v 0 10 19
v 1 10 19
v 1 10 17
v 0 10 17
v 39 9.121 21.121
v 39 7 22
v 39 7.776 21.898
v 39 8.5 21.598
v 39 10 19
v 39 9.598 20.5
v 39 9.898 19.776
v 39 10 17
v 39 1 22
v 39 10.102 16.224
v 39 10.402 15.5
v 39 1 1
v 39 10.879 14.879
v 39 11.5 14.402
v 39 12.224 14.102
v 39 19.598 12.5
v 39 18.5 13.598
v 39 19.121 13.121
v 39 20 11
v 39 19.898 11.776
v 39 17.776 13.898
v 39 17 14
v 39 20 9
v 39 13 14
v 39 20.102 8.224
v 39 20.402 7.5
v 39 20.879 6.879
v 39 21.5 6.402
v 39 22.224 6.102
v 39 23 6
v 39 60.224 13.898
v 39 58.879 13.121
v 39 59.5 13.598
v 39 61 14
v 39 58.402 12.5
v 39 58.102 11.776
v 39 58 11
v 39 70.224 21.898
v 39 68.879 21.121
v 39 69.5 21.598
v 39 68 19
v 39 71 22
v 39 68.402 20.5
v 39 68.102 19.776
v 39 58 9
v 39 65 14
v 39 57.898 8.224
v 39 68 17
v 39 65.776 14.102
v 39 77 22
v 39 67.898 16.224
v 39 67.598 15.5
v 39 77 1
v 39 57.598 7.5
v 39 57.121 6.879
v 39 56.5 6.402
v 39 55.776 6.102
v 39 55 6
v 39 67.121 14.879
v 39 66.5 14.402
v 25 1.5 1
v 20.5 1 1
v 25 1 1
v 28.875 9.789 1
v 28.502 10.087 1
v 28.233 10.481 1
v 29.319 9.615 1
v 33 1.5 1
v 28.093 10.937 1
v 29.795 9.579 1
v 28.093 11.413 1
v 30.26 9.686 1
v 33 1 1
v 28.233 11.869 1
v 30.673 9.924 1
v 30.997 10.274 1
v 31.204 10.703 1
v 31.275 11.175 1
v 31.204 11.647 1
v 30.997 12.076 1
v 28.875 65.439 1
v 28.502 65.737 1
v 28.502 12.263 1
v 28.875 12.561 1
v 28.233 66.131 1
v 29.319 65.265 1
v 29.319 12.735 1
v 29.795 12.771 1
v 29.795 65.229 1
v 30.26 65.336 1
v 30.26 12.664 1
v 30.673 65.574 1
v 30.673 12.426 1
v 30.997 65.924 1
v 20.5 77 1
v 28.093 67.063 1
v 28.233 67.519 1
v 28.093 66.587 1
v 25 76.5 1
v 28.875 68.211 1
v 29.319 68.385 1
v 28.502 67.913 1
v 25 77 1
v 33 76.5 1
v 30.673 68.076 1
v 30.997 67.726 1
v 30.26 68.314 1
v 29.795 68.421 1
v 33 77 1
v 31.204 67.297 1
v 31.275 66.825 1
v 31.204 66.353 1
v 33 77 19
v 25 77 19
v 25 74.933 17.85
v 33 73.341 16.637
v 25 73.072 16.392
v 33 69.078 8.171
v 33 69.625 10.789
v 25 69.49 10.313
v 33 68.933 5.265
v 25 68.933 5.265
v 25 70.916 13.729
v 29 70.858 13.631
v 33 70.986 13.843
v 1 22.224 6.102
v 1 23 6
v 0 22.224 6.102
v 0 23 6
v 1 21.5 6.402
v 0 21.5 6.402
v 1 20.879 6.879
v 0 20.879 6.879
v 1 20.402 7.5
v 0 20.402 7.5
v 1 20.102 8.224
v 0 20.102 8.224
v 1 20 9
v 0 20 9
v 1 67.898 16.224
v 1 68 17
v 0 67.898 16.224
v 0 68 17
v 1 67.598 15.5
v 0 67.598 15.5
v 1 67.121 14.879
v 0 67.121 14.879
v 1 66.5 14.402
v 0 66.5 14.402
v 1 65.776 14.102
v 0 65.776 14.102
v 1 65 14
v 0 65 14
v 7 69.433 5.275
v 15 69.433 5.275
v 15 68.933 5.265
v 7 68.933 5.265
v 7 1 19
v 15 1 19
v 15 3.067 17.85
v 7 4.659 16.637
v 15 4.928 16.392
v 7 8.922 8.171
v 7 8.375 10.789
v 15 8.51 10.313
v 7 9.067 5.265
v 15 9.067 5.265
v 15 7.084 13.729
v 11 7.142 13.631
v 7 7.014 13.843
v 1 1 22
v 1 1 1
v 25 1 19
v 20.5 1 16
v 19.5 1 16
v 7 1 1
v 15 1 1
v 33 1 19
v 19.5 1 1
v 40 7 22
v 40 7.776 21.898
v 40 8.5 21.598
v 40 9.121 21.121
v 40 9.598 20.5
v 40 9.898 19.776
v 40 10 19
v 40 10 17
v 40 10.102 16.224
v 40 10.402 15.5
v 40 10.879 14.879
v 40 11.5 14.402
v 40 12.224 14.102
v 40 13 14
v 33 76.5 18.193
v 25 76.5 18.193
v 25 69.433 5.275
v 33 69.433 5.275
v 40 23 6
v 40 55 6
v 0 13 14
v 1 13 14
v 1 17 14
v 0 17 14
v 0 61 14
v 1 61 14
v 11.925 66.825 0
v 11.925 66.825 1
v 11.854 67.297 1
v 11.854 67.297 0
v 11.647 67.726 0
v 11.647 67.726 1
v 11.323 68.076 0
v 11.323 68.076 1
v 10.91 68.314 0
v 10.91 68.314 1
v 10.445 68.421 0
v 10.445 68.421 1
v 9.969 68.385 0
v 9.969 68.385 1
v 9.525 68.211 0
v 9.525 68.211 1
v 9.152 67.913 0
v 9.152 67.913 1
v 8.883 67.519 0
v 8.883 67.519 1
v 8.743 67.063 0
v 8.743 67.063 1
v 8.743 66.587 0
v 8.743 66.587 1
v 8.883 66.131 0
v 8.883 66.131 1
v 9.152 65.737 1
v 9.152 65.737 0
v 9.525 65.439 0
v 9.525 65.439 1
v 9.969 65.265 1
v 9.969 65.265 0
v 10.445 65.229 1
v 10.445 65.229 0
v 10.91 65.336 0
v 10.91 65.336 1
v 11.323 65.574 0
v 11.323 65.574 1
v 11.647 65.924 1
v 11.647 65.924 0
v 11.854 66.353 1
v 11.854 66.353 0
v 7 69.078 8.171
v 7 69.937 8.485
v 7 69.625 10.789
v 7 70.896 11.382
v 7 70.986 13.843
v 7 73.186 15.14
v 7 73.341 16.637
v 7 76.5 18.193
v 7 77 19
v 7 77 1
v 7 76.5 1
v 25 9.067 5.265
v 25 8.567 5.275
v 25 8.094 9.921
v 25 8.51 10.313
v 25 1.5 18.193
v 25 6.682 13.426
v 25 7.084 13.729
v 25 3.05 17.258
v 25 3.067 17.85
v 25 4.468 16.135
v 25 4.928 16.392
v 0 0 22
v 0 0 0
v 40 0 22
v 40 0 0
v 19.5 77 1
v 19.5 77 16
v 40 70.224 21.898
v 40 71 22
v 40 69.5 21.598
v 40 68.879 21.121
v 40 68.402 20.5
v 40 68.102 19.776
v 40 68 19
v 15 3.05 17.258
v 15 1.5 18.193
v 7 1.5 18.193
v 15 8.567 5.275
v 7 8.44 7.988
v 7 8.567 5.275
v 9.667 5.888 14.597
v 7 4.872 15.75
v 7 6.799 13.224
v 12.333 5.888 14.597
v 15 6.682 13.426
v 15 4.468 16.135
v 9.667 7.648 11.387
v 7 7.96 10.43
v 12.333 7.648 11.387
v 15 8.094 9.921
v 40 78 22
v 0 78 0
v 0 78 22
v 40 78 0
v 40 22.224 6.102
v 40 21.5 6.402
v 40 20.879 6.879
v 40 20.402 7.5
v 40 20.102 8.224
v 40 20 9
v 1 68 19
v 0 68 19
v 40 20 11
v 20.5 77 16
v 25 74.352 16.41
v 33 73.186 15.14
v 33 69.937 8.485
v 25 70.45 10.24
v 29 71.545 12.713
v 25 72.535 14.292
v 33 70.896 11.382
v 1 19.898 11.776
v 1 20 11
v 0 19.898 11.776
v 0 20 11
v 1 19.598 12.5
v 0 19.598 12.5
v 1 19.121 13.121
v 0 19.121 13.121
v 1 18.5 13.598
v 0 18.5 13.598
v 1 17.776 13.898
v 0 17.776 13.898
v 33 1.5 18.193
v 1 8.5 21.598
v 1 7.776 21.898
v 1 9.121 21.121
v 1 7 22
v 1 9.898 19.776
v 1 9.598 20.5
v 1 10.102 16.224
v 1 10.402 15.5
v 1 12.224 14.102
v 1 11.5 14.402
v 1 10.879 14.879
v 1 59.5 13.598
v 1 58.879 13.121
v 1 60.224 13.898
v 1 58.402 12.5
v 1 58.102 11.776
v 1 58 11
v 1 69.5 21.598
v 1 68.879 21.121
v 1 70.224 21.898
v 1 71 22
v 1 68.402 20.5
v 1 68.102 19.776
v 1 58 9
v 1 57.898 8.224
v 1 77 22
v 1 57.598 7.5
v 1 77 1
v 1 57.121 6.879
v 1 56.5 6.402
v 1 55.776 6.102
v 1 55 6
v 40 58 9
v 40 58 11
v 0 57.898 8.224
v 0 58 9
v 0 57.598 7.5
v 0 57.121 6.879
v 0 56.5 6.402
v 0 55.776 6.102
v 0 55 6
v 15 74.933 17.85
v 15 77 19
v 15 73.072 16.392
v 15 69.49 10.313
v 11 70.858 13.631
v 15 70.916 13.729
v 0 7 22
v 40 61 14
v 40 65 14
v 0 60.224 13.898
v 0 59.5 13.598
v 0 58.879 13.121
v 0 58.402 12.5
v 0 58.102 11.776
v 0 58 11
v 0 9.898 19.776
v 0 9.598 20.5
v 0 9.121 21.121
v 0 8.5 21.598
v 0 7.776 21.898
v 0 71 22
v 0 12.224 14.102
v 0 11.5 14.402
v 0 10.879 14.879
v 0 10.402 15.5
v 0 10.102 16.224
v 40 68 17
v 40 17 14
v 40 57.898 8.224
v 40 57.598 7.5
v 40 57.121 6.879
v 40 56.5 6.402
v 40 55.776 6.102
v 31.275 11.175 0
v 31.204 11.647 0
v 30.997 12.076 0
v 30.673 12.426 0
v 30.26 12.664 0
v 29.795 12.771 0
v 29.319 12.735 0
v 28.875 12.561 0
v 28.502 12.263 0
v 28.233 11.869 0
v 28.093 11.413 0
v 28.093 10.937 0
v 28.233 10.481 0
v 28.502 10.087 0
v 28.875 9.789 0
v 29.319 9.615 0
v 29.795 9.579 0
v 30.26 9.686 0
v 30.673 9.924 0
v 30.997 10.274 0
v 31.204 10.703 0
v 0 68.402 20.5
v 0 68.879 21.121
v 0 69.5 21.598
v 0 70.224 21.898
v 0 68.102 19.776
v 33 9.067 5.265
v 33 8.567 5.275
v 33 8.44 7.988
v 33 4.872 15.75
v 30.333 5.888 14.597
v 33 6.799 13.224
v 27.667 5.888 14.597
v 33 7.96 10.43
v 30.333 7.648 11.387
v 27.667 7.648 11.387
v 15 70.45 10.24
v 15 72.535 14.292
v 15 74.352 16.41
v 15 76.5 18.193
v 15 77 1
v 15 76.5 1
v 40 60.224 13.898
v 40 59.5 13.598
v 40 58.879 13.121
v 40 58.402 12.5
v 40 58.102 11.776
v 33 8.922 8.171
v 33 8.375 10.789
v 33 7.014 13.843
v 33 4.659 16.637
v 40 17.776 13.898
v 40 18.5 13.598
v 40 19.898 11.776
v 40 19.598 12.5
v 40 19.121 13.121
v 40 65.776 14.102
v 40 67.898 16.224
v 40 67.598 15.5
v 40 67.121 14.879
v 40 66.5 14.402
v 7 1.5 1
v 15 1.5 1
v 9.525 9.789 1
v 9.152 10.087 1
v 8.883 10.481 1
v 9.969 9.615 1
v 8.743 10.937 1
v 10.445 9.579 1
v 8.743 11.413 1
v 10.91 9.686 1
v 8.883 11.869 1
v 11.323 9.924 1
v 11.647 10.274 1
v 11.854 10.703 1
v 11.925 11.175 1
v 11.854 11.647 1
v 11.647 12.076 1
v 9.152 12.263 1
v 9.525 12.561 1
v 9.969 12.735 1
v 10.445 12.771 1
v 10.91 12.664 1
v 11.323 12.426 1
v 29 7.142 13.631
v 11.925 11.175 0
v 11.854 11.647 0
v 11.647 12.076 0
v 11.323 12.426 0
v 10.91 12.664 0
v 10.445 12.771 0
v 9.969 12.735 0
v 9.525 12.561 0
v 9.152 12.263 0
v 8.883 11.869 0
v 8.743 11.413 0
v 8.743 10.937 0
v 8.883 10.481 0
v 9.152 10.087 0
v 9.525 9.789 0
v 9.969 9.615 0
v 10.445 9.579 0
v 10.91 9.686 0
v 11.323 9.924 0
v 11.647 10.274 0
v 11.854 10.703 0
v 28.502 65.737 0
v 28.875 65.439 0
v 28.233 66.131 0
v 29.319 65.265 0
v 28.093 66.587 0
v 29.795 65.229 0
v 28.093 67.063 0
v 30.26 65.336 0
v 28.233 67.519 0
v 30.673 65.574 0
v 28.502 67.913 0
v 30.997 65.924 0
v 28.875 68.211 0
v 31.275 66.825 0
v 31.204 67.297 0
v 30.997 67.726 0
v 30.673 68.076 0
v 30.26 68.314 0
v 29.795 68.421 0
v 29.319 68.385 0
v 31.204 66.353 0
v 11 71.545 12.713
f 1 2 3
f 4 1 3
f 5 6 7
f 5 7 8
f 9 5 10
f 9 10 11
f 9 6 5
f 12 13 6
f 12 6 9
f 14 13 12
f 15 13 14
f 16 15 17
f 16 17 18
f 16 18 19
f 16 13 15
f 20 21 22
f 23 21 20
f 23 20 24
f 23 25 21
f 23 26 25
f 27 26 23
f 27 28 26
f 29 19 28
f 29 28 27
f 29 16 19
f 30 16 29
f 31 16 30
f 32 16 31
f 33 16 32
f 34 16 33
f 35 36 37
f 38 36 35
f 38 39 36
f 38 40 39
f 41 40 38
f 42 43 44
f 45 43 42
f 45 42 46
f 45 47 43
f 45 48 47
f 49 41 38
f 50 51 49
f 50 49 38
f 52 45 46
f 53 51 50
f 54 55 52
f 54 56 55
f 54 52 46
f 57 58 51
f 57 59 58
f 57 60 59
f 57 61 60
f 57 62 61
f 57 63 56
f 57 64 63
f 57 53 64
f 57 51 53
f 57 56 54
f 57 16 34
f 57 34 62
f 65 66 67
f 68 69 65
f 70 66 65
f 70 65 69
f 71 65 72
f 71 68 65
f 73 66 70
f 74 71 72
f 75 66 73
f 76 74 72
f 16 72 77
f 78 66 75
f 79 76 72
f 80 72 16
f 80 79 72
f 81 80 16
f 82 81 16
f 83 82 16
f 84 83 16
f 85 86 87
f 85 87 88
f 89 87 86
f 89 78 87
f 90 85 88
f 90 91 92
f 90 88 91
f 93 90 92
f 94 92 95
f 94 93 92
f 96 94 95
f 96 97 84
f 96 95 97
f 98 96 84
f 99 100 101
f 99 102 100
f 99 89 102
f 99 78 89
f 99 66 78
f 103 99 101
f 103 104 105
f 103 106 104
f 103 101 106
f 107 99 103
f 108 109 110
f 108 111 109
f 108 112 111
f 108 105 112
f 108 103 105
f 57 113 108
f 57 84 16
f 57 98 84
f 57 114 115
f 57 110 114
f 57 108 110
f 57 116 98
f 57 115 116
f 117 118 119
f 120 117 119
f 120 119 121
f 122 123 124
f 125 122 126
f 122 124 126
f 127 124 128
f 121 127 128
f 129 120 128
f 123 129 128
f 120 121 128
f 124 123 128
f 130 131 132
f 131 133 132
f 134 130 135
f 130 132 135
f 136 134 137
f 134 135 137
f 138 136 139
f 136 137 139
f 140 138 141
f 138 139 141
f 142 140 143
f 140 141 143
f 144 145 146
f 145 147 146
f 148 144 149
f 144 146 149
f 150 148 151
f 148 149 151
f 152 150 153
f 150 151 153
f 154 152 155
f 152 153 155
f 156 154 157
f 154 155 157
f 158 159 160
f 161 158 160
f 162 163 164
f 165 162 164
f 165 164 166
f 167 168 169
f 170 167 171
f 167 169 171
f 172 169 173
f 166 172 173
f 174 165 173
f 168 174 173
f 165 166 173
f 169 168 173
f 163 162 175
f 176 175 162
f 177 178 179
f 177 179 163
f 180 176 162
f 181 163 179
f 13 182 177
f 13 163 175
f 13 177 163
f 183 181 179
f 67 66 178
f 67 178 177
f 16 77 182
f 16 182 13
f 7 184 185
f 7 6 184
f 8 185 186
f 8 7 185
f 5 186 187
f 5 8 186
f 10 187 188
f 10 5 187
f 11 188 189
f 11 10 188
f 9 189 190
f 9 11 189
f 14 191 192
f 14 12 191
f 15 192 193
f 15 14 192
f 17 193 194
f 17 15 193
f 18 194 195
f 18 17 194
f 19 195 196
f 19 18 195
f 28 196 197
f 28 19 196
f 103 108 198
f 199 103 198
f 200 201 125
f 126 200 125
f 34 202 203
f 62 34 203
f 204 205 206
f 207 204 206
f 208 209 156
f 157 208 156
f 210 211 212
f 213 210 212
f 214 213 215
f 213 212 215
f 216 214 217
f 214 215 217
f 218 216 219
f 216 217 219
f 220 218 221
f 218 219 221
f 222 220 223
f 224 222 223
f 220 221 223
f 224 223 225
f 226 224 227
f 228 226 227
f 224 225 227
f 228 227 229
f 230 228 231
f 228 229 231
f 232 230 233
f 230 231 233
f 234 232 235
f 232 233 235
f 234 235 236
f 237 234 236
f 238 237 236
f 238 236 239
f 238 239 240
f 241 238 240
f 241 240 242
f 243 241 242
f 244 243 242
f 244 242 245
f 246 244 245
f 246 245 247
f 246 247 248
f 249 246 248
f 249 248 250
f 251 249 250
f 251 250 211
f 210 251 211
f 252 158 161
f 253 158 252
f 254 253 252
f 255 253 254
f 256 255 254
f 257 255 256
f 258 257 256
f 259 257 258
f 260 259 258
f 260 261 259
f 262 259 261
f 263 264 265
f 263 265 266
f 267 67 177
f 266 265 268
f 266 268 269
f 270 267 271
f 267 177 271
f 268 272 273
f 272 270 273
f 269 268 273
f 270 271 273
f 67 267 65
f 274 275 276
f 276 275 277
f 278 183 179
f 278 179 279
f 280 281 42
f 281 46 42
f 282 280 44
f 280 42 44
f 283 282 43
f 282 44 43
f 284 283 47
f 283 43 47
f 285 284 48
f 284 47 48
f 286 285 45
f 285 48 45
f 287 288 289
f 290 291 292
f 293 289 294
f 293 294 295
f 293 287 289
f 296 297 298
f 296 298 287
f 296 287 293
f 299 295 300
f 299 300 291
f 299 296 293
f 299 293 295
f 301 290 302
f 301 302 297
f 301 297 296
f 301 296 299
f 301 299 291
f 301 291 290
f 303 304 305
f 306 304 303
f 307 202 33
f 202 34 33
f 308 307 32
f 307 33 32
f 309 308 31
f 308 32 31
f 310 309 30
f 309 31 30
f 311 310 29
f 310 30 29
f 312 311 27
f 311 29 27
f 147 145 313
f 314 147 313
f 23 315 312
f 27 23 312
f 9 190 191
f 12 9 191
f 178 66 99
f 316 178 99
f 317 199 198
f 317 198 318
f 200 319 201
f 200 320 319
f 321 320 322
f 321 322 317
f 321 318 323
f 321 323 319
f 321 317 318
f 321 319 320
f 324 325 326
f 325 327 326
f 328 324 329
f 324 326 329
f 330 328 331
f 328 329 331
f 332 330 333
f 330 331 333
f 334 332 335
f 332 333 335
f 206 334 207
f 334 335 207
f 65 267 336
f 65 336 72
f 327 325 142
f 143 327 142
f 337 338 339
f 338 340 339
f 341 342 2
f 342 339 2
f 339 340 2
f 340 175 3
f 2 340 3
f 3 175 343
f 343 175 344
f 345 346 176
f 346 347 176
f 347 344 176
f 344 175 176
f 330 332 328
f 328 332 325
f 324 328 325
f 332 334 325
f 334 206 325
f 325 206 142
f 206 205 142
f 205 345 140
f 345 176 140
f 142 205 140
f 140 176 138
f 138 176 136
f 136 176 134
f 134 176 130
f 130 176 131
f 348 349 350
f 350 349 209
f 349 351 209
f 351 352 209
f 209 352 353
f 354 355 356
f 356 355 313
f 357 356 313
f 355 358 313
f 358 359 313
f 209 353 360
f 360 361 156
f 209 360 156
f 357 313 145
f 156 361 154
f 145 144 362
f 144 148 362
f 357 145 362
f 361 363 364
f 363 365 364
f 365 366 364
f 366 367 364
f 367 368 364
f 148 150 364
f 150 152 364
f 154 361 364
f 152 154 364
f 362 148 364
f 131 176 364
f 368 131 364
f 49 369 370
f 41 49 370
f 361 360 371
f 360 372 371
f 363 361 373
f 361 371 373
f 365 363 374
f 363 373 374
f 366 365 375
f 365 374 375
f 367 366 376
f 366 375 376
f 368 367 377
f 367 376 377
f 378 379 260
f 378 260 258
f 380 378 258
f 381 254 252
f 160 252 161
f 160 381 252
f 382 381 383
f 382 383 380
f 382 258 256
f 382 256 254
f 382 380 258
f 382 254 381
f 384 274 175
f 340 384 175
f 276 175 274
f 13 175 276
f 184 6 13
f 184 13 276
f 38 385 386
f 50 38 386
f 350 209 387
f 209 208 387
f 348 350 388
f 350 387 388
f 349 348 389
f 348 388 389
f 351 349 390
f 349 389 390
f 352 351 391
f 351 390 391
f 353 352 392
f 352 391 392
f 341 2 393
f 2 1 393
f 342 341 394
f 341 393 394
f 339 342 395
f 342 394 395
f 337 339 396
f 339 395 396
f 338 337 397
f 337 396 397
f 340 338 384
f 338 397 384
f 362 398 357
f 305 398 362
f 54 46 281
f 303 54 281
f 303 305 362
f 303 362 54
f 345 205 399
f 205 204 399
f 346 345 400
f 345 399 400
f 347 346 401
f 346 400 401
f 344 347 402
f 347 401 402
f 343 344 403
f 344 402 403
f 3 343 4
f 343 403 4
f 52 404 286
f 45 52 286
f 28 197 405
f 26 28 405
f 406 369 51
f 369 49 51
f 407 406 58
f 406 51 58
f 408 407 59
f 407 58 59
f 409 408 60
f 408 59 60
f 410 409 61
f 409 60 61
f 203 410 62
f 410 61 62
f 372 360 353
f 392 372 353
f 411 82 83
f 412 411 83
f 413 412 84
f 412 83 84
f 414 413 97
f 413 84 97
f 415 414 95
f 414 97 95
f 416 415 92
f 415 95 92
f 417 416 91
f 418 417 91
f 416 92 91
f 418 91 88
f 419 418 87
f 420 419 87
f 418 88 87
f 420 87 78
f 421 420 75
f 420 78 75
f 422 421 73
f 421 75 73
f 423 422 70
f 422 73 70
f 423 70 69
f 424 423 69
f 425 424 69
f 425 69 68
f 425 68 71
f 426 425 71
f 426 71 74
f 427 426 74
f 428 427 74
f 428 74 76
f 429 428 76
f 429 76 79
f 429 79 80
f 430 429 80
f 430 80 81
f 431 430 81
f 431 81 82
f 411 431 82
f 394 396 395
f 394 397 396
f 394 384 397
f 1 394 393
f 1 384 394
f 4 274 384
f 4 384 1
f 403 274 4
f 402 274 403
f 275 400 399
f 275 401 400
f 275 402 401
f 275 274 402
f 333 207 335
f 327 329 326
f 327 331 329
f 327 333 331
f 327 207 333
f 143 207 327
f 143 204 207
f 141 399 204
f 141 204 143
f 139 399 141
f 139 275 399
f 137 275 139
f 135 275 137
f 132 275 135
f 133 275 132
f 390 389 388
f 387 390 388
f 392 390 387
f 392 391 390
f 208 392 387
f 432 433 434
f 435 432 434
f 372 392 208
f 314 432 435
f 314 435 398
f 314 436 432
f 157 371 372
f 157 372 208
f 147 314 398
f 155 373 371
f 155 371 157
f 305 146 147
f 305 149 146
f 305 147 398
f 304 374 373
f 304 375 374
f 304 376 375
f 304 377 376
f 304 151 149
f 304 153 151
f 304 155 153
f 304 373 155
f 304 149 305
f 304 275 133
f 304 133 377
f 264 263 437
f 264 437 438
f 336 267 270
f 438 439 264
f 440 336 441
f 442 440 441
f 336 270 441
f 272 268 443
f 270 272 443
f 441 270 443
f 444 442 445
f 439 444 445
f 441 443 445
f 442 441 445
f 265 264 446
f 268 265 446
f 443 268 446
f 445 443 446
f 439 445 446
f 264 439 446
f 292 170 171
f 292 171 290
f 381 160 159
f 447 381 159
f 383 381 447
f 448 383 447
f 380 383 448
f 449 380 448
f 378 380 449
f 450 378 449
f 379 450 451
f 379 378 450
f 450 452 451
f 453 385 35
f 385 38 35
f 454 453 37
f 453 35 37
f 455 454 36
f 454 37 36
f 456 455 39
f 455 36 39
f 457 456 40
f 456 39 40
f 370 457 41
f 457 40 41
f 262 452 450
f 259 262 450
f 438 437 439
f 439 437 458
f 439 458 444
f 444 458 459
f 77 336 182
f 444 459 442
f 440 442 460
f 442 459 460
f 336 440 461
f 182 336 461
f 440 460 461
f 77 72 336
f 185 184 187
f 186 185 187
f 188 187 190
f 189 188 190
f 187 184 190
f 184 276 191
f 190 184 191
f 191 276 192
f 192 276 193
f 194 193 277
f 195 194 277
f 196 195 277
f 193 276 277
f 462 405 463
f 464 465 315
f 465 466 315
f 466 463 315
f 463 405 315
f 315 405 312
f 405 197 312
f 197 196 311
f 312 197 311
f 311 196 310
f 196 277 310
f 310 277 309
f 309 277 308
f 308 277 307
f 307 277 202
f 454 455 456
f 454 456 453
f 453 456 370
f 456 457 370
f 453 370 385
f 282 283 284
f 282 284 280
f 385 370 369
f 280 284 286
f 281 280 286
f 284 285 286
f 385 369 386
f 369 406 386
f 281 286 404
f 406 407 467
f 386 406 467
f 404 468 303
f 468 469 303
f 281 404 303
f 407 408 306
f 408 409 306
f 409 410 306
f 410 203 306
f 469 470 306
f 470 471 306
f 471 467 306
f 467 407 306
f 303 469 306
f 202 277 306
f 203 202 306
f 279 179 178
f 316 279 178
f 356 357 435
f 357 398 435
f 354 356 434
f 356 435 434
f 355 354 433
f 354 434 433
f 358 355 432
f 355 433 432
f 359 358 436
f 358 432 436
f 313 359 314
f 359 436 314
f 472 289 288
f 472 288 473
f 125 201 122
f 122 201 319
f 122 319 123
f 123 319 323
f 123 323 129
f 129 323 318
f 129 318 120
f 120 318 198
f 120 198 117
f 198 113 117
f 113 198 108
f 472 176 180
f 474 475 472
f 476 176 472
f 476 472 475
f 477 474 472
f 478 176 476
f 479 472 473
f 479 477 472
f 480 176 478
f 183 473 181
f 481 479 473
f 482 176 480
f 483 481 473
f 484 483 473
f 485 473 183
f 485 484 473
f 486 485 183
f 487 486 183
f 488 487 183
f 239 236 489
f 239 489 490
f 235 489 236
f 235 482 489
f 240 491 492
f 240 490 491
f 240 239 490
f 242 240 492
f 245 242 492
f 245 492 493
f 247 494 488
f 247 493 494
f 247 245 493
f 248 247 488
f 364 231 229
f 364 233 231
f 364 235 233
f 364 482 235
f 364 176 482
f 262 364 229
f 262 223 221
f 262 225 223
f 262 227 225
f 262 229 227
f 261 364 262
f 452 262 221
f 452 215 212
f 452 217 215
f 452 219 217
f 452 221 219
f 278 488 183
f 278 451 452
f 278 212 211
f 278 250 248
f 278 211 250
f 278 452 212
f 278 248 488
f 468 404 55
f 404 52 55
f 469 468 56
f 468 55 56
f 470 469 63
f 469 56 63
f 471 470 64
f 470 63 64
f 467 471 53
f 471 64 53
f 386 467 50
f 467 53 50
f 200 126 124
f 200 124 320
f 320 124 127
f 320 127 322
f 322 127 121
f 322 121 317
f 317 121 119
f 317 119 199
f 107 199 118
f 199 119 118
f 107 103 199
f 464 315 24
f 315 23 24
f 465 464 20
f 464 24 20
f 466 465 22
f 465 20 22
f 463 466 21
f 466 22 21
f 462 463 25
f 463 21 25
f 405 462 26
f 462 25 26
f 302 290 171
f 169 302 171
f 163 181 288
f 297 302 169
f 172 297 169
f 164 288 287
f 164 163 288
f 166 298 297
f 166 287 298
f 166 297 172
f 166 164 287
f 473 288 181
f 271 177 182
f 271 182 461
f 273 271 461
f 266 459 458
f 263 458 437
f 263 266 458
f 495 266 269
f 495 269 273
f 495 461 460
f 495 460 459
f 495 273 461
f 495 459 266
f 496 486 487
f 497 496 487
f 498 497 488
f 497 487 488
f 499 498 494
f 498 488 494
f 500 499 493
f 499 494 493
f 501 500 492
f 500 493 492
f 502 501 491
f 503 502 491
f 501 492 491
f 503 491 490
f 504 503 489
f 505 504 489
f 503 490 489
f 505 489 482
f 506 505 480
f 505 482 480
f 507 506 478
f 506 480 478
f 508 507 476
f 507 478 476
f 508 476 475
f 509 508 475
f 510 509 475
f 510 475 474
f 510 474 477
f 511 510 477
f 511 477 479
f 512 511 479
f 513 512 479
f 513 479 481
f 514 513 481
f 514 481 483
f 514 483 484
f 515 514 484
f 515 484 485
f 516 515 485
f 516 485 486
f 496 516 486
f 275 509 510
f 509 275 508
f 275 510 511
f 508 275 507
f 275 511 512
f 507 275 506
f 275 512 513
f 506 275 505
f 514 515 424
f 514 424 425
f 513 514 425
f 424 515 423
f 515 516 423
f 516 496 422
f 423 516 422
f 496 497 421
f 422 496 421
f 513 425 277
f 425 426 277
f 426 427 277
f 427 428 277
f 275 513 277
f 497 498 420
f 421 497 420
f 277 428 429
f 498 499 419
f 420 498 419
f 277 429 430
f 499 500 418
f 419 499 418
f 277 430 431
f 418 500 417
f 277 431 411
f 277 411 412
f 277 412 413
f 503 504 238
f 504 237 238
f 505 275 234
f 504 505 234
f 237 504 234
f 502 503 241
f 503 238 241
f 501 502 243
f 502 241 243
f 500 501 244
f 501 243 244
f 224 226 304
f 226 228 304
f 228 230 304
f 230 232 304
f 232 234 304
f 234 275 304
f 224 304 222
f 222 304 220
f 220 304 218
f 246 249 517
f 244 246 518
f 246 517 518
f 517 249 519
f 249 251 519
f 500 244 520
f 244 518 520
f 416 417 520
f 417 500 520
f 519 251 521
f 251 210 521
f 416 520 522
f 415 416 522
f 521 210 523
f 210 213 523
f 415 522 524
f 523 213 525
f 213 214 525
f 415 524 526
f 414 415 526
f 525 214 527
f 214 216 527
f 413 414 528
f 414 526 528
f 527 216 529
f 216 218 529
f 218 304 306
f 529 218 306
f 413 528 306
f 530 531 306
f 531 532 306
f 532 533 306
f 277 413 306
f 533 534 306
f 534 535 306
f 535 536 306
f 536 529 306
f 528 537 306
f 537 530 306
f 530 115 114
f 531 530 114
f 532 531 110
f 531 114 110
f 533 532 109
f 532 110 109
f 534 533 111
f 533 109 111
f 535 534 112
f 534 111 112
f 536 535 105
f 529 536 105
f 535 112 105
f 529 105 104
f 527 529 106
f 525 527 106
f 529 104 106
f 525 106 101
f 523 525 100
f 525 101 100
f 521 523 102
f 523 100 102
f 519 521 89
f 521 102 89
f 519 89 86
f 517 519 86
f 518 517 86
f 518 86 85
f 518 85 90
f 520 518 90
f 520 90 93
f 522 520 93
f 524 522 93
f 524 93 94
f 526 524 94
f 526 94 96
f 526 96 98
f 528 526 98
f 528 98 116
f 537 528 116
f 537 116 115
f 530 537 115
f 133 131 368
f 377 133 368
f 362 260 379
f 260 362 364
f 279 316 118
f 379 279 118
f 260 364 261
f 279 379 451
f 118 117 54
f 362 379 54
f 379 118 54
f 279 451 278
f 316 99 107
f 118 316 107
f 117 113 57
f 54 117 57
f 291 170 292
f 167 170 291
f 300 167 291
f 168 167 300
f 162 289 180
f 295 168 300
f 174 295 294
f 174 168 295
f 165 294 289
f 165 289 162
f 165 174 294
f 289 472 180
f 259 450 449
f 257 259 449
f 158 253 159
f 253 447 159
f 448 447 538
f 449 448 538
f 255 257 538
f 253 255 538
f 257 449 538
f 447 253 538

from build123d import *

# Parameters (mm, degrees)
SKETCH1_W           = 40
SKETCH1_H           = 78
BOSS_EXTRUDE1_DEPTH = 22
SHELL1_T            = -1
CUT_EXTRUDE1_REACH  = 92.377
FILLET1_R           = 3
BOSS_EXTRUDE2_DEPTH = 13
CUT_EXTRUDE2_REACH  = 92.377
SKETCH4_W           = 10
SKETCH4_H           = 10
SKETCH6_W           = 1
SKETCH6_H           = 76
BOSS_EXTRUDE3_DEPTH = 15
SKETCH7_R           = 1.6
CUT_EXTRUDE3_DEPTH  = 15


with BuildPart() as part:
    # Sketch1 → Boss-Extrude1 (new body)
    with BuildSketch(Plane.XY):
        with Locations((20, 39)):
            Rectangle(SKETCH1_W, SKETCH1_H)
    extrude(amount=BOSS_EXTRUDE1_DEPTH)

    # Shell1
    shell1_openings = [part.faces().sort_by_distance(p)[0] for p in [
        (20, 39, 22),
    ]]
    offset(amount=SHELL1_T, openings=shell1_openings, kind=Kind.INTERSECTION)

    # Cut-Extrude1: up to this face of the body (flat: up to its plane)
    cut_extrude1_end = Plane(part.part.faces().sort_by_distance((0, 39, 11))[0])
    # Sketch2 → Cut-Extrude1 (cut, up to the picked face)
    with BuildSketch(Plane(origin=(40, 0, 0), x_dir=(0, 0, -1), z_dir=(1, 0, 0)), mode=Mode.PRIVATE) as cut_extrude1_sk1:
        Polygon((-22, 10), (-14, 10), (-14, 20), (-6, 20), (-6, 58), (-14, 58), (-14, 68), (-22, 68), align=None)
    cut_extrude1_tool1 = split(extrude(cut_extrude1_sk1.sketch, amount=-CUT_EXTRUDE1_REACH, mode=Mode.PRIVATE), bisect_by=cut_extrude1_end, keep=Keep.BOTH, mode=Mode.PRIVATE)
    add(cut_extrude1_tool1.solids().sort_by(Axis((40, 39, 14.833333), (-1, 0, 0)))[0], mode=Mode.SUBTRACT)

    # Fillet1
    fillet1_edges = [part.edges().sort_by_distance(p)[0] for p in [
        (0.5, 10, 22),
        (0.5, 68, 22),
        (0.5, 68, 14),
        (0.5, 58, 14),
        (0.5, 58, 6),
        (0.5, 20, 6),
        (0.5, 20, 14),
        (0.5, 10, 14),
        (39.5, 10, 22),
        (39.5, 68, 22),
        (39.5, 68, 14),
        (39.5, 58, 14),
        (39.5, 58, 6),
        (39.5, 20, 6),
        (39.5, 20, 14),
        (39.5, 10, 14),
    ]]
    fillet(fillet1_edges, radius=FILLET1_R)

    # Sketch3 → Boss-Extrude2 (add, symmetric)
    with BuildSketch(Plane(origin=(20, 0, 0), x_dir=(0, 0, -1), z_dir=(1, 0, 0))):
        with BuildLine():
            Line((-1, 1), (-19, 1))
            add(Edge.make_bspline(
                [(-19, 1), (-15.129811325, 9.249678545), (-5.265487128, 9.067042822)],
                knots=[0, 0, 0, 1, 1, 1], degree=2))
            Line((-5.265487128, 9.067042822), (-5.274742928, 8.567128499))
            add(Edge.make_bspline(
                [(-18.193150022, 1.5), (-16.753433037, 4.226674383), (-13.159011892, 6.996200729), (-8.728135169, 8.626895855), (-5.274742928, 8.567128499)],
                knots=[0.045482842, 0.045482842, 0.045482842, 0.403426776, 0.642056066, 1, 1, 1], degree=2))
            Line((-18.193150022, 1.5), (-1, 1.5))
            Line((-1, 1.5), (-1, 1))
        make_face()
        with BuildLine():
            Line((-5.274742928, 69.432871501), (-5.265487128, 68.932957178))
            add(Edge.make_bspline(
                [(-19, 77), (-15.129811325, 68.750321455), (-5.265487128, 68.932957178)],
                knots=[0, 0, 0, 1, 1, 1], degree=2))
            Line((-19, 77), (-1, 77))
            Line((-1, 77), (-1, 76.5))
            Line((-1, 76.5), (-18.193150022, 76.5))
            add(Edge.make_bspline(
                [(-18.193150022, 76.5), (-13.692591499, 70.12438977), (-5.274742928, 69.432871501)],
                knots=[0.057815428, 0.057815428, 0.057815428, 1, 1, 1], degree=2))
        make_face()
    extrude(amount=BOSS_EXTRUDE2_DEPTH, both=True)

    # Cut-Extrude2: up to this face of the body (flat: up to its plane)
    cut_extrude2_end = Plane(part.part.faces().sort_by_distance((20, 39, 1))[0])
    # Sketch4 → Cut-Extrude2 (cut, up to the picked face)
    with BuildSketch(Plane.XY.offset(22), mode=Mode.PRIVATE) as cut_extrude2_sk1:
        with Locations((20, 6)):
            Rectangle(SKETCH4_W, SKETCH4_H)
    cut_extrude2_tool1 = split(extrude(cut_extrude2_sk1.sketch, amount=-CUT_EXTRUDE2_REACH, mode=Mode.PRIVATE), bisect_by=cut_extrude2_end, keep=Keep.BOTH, mode=Mode.PRIVATE)
    # Sketch4 → Cut-Extrude2 (cut, up to the picked face)
    with BuildSketch(Plane.XY.offset(22), mode=Mode.PRIVATE) as cut_extrude2_sk2:
        with Locations((20, 72)):
            Rectangle(SKETCH4_W, SKETCH4_H)
    cut_extrude2_tool2 = split(extrude(cut_extrude2_sk2.sketch, amount=-CUT_EXTRUDE2_REACH, mode=Mode.PRIVATE), bisect_by=cut_extrude2_end, keep=Keep.BOTH, mode=Mode.PRIVATE)
    add(cut_extrude2_tool1.solids().sort_by(Axis((20, 6, 22), (0, 0, -1)))[0], mode=Mode.SUBTRACT)
    add(cut_extrude2_tool2.solids().sort_by(Axis((20, 72, 22), (0, 0, -1)))[0], mode=Mode.SUBTRACT)

    # Sketch6 → Boss-Extrude3 (add)
    with BuildSketch(Plane.XY.offset(1)):
        with Locations((20, 39)):
            Rectangle(SKETCH6_W, SKETCH6_H)
    extrude(amount=BOSS_EXTRUDE3_DEPTH)

    # Sketch7 → Cut-Extrude3 (cut)
    with BuildSketch(Plane.XY.offset(1)):
        with Locations((10.325, 11.175)):
            Circle(SKETCH7_R)
        with Locations((10.325, 66.825)):
            Circle(SKETCH7_R)
        with Locations((29.675, 11.175)):
            Circle(SKETCH7_R)
        with Locations((29.675, 66.825)):
            Circle(SKETCH7_R)
    extrude(amount=-CUT_EXTRUDE3_DEPTH, mode=Mode.SUBTRACT)


solid = part.part
